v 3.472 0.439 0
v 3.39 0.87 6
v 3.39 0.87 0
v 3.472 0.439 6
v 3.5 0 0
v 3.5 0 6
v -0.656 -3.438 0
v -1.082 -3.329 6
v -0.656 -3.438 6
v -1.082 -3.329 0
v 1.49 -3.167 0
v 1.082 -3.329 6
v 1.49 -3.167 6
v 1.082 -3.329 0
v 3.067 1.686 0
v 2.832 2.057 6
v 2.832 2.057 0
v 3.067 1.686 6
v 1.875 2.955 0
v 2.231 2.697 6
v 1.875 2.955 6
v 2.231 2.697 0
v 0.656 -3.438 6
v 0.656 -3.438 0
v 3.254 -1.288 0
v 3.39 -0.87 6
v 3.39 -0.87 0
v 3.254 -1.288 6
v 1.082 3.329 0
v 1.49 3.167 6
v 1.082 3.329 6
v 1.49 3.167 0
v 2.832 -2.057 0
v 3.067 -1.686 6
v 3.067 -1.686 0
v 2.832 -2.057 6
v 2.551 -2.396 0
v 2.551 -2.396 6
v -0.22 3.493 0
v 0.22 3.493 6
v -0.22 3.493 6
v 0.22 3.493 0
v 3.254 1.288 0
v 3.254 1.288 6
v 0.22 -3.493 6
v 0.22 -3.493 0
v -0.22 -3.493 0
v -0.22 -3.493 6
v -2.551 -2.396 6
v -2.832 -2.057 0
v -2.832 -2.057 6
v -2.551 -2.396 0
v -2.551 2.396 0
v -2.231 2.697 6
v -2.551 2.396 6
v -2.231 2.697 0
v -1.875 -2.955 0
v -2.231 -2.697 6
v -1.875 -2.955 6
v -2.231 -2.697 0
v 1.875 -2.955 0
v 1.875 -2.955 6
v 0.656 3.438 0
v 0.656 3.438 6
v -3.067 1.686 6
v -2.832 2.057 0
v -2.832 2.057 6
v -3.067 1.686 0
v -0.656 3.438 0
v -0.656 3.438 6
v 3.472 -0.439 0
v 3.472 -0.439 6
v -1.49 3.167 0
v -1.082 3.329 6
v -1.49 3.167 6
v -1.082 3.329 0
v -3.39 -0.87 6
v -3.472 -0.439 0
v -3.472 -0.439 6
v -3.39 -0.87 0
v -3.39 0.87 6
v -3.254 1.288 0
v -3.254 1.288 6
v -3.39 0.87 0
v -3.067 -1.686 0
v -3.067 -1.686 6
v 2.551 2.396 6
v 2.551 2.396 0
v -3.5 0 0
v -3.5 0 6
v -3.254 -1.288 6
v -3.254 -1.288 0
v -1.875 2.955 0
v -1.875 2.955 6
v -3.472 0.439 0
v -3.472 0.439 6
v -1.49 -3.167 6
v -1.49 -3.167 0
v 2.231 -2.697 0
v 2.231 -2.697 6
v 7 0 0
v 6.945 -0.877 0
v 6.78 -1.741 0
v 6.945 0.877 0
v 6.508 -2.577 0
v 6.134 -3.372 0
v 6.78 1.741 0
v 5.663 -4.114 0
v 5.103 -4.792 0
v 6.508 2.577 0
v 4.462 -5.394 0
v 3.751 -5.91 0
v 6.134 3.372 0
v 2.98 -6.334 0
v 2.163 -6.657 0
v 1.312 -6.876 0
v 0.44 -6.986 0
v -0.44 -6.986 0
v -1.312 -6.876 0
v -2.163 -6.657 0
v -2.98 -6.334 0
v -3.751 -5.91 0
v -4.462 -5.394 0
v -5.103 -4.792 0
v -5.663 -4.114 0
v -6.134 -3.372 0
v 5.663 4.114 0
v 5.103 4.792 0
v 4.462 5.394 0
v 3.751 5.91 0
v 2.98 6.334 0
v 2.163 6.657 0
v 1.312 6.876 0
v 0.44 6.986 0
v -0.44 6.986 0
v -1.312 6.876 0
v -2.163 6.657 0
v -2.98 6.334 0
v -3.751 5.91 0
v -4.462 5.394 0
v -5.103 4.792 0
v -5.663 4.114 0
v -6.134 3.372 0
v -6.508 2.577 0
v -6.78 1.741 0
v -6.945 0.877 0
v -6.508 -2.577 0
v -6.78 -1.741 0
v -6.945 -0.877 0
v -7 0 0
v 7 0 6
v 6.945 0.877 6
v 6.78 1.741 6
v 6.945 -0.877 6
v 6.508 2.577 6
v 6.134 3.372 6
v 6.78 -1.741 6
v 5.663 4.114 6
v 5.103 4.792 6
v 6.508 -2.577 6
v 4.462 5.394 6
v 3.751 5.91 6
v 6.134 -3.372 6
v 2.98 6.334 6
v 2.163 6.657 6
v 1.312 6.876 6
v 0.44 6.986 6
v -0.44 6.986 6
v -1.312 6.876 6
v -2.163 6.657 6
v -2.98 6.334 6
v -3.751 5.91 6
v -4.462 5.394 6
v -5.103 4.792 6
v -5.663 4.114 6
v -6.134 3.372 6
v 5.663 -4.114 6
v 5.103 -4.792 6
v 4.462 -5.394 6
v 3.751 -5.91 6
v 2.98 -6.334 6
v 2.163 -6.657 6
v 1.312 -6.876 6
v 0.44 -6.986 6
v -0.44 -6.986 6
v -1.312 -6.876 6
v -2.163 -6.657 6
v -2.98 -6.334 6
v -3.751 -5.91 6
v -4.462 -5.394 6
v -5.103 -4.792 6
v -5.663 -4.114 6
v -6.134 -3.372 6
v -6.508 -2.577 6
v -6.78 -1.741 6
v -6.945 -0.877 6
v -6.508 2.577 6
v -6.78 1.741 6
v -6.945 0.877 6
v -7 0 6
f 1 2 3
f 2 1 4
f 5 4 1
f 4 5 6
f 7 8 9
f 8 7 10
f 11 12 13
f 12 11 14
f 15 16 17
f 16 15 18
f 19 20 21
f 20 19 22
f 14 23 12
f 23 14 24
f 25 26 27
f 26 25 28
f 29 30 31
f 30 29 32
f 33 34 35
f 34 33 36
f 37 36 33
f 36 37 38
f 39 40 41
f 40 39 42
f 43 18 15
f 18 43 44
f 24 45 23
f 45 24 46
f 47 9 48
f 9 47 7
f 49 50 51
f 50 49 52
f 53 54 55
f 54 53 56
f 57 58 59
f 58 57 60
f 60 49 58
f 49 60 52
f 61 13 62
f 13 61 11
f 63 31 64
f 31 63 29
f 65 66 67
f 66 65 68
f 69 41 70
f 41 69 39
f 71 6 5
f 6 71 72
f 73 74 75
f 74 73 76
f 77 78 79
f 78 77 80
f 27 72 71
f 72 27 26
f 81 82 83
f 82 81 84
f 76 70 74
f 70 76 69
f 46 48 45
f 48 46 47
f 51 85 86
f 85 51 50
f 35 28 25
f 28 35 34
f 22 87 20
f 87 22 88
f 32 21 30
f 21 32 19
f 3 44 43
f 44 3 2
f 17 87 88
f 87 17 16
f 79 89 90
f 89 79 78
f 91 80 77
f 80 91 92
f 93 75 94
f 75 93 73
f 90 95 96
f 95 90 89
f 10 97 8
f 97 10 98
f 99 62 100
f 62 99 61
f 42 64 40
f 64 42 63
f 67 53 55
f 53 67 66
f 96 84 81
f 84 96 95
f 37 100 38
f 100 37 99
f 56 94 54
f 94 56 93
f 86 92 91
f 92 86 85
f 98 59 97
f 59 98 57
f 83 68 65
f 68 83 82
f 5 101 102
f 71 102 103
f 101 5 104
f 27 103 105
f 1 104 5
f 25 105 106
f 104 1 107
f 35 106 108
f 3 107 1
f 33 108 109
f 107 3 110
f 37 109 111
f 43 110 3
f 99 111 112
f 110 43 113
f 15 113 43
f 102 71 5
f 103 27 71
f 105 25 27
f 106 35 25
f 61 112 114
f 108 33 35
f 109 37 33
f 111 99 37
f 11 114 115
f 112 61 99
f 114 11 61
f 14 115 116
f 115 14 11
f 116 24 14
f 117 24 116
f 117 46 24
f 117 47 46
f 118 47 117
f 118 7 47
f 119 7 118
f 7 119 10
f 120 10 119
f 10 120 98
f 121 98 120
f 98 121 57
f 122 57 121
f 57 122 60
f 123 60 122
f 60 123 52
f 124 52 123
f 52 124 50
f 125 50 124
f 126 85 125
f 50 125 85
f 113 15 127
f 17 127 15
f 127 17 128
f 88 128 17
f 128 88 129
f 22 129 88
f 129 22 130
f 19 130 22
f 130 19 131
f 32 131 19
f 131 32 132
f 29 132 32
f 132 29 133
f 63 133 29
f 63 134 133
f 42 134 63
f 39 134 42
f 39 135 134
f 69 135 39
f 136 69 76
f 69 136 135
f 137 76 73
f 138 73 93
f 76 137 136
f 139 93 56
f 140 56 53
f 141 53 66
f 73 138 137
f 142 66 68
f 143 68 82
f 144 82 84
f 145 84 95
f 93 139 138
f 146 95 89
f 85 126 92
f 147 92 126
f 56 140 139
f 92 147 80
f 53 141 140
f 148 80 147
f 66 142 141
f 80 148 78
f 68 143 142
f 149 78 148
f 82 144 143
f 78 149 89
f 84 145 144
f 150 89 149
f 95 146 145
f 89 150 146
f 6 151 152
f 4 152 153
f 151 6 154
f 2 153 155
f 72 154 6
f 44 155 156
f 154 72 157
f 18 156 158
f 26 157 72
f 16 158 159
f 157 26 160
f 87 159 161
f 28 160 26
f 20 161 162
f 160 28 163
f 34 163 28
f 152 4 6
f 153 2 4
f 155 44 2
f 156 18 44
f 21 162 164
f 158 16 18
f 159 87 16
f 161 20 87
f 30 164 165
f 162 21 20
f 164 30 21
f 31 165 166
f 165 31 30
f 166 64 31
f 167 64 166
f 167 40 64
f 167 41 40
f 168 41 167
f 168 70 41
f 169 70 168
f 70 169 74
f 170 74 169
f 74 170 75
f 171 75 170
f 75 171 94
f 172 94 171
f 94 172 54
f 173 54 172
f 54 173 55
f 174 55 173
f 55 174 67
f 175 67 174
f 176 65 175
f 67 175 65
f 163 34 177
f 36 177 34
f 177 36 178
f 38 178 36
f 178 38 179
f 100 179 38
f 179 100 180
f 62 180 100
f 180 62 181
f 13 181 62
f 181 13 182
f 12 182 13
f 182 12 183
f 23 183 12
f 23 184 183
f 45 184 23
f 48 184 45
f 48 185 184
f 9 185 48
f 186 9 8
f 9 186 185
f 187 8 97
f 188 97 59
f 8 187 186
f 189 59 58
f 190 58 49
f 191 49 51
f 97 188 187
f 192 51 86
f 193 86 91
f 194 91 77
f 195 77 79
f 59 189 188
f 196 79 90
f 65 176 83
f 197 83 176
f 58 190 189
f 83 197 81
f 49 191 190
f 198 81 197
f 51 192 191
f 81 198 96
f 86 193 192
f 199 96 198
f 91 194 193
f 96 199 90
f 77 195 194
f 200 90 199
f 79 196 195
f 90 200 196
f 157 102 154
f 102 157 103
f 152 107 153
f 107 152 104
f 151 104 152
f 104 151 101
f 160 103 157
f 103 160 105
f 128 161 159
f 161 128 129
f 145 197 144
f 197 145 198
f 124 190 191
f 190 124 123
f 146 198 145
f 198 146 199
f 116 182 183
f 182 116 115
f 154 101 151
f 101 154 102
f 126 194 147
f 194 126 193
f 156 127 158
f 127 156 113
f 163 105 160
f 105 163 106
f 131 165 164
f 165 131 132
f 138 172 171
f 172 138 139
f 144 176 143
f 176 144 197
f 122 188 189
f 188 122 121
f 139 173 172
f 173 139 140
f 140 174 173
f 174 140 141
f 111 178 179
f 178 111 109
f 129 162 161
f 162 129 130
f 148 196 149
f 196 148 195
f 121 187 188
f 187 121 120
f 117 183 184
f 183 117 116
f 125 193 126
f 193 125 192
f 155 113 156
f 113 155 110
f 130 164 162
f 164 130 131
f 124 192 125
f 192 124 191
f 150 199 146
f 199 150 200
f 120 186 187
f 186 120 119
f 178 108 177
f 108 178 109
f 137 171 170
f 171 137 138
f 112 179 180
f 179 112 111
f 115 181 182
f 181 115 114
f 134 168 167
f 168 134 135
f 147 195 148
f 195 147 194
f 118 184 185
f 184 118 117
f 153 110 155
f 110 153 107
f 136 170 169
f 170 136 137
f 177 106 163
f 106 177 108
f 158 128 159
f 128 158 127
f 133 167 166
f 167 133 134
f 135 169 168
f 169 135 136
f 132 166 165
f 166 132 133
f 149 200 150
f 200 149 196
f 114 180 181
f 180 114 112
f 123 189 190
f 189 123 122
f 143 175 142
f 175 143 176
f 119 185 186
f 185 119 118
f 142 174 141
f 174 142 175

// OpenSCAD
$fn = 50;

difference() {
	union() {
		cylinder(h = 6, r = 7.0);
	}
	union() {
		translate(v = [0.0, 0.0, -100.0]) {
			cylinder(h = 200, r = 3.25);
		}
		translate(v = [0.0, 0.0, -100.0]) {
			cylinder(h = 200, r = 1.8);
		}
		cylinder(h = 6, r = 3.5);
	}
}
